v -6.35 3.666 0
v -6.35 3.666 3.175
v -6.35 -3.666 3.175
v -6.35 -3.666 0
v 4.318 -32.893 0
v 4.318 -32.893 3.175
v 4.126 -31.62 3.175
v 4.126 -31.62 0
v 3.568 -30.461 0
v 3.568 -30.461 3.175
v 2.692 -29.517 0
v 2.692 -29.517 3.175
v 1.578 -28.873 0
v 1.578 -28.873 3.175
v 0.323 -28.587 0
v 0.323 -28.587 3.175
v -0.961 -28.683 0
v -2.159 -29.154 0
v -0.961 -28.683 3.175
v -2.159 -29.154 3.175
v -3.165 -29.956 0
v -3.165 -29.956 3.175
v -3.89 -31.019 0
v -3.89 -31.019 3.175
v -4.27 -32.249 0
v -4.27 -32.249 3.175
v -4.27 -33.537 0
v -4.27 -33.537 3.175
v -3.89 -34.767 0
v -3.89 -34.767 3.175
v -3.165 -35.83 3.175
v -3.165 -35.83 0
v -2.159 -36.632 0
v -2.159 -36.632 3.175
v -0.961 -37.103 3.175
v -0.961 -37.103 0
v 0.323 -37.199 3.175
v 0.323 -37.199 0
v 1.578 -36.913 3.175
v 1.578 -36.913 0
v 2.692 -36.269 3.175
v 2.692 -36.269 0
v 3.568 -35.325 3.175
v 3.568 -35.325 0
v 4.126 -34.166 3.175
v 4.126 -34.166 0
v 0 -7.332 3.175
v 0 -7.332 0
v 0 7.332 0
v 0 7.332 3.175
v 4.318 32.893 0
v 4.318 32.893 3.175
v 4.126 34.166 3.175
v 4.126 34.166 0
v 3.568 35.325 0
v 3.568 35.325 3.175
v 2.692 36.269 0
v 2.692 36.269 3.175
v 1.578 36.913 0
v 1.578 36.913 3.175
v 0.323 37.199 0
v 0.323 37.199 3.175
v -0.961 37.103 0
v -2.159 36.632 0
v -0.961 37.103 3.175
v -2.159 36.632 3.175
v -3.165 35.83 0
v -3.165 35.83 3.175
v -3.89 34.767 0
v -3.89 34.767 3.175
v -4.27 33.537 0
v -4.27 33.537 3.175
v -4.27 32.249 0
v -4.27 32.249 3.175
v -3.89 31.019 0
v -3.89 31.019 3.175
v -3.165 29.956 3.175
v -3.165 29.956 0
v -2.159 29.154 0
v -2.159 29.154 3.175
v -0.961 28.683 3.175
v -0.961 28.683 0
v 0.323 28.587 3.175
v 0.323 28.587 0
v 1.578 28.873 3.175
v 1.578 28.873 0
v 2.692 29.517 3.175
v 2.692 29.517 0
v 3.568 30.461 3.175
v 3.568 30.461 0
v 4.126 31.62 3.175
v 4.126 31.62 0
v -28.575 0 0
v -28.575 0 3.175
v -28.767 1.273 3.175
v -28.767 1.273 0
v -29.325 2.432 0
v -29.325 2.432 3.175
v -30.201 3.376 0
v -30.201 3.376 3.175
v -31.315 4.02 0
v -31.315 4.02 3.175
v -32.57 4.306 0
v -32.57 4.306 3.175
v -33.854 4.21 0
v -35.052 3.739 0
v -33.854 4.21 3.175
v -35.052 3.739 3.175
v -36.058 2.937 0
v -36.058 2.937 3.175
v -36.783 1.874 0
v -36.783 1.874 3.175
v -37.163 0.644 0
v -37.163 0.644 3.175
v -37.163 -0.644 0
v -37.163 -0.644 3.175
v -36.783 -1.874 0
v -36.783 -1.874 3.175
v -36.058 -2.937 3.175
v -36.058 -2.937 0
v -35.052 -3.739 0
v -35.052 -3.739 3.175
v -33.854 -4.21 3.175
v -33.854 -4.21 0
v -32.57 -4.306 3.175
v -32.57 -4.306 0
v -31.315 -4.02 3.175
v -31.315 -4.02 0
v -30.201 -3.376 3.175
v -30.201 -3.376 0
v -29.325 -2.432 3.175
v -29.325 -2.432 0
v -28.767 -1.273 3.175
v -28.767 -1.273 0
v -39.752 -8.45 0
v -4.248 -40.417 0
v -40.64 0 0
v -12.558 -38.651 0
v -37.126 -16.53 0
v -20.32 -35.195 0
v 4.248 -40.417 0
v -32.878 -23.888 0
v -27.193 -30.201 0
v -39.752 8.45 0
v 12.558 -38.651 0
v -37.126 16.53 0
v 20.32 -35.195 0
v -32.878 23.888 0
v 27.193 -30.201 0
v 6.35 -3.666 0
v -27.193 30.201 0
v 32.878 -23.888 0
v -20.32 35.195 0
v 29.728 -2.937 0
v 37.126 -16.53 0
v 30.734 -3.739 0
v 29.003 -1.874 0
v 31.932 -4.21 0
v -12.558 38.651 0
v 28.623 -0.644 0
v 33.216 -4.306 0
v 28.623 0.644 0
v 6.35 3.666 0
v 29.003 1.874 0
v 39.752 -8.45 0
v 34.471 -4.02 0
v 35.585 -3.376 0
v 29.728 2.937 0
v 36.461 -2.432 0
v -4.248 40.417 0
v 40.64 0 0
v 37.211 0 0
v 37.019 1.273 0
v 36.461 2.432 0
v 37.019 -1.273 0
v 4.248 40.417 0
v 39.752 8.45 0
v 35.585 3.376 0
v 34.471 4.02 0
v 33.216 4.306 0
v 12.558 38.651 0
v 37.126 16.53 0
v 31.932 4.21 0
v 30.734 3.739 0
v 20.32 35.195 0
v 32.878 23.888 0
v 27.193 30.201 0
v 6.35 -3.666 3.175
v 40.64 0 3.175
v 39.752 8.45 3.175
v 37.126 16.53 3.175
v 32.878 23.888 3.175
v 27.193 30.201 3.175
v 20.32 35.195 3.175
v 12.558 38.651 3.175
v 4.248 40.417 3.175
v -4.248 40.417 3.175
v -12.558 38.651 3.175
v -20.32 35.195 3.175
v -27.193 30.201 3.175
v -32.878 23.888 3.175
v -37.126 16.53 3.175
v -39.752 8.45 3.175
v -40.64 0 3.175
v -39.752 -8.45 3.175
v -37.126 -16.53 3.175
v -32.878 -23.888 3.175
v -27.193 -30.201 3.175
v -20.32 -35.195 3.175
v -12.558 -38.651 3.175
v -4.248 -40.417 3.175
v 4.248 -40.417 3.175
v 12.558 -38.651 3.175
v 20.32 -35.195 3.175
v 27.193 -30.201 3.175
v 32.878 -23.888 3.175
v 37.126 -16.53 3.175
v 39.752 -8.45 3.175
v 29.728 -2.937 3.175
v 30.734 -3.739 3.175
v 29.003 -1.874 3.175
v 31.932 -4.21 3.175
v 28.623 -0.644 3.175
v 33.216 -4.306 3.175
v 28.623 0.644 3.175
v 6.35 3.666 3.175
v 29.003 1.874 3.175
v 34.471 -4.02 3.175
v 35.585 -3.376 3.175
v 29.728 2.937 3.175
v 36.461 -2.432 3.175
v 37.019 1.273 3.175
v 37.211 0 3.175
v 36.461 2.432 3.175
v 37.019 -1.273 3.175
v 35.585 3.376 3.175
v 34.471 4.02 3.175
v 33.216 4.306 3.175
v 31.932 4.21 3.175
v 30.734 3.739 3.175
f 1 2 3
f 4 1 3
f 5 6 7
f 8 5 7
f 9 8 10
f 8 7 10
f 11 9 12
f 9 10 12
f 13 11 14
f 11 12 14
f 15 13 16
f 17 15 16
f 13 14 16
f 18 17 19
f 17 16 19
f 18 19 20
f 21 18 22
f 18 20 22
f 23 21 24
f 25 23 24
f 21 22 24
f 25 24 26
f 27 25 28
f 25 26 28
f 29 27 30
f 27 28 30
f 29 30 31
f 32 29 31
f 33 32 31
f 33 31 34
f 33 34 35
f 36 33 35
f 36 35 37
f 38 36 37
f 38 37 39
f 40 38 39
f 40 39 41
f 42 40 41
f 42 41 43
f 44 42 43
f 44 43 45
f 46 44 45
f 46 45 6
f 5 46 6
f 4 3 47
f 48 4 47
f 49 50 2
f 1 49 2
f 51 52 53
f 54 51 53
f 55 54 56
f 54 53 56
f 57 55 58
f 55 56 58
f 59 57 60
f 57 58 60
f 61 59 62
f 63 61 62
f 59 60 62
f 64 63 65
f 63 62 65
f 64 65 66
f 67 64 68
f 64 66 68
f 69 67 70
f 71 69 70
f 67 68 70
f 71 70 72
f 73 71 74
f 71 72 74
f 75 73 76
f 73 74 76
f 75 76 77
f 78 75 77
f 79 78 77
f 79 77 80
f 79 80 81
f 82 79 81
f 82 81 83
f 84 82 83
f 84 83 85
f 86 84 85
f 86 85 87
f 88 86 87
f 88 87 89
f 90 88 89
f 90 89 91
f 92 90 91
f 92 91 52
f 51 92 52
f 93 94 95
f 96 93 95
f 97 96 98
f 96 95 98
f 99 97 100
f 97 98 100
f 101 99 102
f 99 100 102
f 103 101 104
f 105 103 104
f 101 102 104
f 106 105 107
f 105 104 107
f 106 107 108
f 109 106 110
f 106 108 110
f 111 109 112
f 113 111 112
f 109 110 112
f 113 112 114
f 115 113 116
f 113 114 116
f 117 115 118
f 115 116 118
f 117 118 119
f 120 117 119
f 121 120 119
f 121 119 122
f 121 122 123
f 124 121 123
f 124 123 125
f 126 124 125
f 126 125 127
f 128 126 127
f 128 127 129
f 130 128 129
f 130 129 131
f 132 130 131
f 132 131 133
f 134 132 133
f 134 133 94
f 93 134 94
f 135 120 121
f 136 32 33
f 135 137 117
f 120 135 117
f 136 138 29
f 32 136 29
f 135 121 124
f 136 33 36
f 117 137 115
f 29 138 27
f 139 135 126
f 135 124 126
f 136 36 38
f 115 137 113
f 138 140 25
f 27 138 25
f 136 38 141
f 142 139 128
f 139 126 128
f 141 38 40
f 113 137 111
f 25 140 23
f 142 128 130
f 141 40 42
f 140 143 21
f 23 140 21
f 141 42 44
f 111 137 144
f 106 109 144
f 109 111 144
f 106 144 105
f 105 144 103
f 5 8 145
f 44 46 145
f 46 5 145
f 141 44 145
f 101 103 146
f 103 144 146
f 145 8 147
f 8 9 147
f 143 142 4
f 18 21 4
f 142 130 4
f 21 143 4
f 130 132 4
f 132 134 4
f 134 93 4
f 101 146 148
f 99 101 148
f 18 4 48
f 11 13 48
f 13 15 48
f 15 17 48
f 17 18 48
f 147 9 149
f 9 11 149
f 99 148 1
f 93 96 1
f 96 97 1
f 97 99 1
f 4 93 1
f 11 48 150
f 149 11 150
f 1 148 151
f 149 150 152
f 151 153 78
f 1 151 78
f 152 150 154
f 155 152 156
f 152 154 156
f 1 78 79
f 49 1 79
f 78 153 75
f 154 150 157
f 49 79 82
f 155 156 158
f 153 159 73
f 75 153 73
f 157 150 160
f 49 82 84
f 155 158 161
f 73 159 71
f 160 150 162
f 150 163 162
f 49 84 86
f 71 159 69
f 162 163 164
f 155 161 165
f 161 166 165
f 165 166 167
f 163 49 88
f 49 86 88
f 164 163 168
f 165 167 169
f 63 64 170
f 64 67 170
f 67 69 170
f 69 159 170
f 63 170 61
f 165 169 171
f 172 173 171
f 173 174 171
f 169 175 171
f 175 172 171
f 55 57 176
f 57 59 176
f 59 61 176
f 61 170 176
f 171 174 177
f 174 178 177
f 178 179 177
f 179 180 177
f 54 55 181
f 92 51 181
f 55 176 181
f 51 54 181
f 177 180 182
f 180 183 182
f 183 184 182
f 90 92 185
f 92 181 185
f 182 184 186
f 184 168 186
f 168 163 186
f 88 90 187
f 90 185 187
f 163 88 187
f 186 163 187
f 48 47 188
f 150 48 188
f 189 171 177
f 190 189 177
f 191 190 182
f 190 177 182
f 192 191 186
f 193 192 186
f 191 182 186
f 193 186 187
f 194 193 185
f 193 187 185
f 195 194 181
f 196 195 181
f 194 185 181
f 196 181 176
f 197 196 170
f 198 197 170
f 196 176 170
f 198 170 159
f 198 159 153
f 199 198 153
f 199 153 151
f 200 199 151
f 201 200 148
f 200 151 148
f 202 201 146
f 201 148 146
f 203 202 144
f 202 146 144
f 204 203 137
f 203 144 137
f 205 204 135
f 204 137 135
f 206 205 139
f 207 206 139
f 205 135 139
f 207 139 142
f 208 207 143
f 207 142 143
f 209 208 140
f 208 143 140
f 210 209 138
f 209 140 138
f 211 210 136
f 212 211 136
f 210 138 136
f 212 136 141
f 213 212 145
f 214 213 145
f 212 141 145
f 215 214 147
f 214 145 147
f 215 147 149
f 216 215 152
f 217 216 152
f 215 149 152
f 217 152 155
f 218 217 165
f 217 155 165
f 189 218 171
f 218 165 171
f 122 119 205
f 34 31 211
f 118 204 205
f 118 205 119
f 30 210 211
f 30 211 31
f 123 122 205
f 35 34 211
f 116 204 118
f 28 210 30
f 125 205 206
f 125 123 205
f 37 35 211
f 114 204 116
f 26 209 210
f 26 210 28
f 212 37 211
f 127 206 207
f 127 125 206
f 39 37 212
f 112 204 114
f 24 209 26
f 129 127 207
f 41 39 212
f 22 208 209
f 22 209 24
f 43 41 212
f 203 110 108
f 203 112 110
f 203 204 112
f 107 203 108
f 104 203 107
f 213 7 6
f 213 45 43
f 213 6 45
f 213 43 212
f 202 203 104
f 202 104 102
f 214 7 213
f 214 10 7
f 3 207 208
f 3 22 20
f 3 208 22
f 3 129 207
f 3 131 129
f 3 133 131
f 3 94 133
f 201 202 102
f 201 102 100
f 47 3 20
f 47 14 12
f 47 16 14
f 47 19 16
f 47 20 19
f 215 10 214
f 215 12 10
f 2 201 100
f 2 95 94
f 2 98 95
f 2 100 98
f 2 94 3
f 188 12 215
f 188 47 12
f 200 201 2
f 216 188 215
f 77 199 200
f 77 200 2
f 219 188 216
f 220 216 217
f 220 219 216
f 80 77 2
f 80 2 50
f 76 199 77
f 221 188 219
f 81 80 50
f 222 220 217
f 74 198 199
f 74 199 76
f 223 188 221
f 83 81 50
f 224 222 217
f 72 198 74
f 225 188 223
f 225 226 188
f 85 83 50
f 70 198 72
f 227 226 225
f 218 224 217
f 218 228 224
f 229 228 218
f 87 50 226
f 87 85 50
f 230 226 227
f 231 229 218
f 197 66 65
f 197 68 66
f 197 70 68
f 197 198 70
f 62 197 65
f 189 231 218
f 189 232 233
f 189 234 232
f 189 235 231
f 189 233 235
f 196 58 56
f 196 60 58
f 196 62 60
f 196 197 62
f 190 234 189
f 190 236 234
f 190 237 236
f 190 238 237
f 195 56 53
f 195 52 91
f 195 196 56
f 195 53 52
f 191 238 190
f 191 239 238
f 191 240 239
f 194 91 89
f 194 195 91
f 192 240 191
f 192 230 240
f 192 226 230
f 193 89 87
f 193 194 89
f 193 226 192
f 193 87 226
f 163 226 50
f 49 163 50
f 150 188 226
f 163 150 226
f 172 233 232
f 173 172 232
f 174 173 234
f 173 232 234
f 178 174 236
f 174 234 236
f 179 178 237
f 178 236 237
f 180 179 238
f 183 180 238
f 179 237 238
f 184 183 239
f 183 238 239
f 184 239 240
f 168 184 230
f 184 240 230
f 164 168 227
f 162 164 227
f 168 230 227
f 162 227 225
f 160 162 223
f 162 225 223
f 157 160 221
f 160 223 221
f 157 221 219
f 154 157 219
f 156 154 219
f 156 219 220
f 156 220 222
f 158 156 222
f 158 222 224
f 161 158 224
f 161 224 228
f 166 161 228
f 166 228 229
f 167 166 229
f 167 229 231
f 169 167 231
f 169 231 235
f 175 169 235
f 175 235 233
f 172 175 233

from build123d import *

# Parameters (mm, degrees)
F0_R     = 40.64
F1_DEPTH = 3.175
F2_R     = 4.318
F4_DEPTH = 25.4
F5_DEPTH = 25.4


with BuildPart() as f1:
    # F0 (on Top) → F1 (new body)
    with BuildSketch(Plane.XY):
        Circle(F0_R)
    extrude(amount=F1_DEPTH)

    # F2 (on face) → F4 (cut)
    with BuildSketch(Plane.XY.offset(3.175)):
        with Locations((-32.893, 0)):
            Circle(F2_R)
        with Locations((0, -32.893)):
            Circle(F2_R)
        with Locations((32.893, 0)):
            Circle(F2_R)
        with Locations((0, 32.893)):
            Circle(F2_R)
    extrude(amount=-F4_DEPTH, mode=Mode.SUBTRACT)

    # F3 (on face) → F5 (cut)
    with BuildSketch(Plane.XY.offset(3.175)):
        Polygon((6.35, -3.666174), (6.35, 3.666174), (0, 7.332348), (-6.35, 3.666174), (-6.35, -3.666174), (0, -7.332348), align=None)
    extrude(amount=-F5_DEPTH, mode=Mode.SUBTRACT)


solid = f1.part
